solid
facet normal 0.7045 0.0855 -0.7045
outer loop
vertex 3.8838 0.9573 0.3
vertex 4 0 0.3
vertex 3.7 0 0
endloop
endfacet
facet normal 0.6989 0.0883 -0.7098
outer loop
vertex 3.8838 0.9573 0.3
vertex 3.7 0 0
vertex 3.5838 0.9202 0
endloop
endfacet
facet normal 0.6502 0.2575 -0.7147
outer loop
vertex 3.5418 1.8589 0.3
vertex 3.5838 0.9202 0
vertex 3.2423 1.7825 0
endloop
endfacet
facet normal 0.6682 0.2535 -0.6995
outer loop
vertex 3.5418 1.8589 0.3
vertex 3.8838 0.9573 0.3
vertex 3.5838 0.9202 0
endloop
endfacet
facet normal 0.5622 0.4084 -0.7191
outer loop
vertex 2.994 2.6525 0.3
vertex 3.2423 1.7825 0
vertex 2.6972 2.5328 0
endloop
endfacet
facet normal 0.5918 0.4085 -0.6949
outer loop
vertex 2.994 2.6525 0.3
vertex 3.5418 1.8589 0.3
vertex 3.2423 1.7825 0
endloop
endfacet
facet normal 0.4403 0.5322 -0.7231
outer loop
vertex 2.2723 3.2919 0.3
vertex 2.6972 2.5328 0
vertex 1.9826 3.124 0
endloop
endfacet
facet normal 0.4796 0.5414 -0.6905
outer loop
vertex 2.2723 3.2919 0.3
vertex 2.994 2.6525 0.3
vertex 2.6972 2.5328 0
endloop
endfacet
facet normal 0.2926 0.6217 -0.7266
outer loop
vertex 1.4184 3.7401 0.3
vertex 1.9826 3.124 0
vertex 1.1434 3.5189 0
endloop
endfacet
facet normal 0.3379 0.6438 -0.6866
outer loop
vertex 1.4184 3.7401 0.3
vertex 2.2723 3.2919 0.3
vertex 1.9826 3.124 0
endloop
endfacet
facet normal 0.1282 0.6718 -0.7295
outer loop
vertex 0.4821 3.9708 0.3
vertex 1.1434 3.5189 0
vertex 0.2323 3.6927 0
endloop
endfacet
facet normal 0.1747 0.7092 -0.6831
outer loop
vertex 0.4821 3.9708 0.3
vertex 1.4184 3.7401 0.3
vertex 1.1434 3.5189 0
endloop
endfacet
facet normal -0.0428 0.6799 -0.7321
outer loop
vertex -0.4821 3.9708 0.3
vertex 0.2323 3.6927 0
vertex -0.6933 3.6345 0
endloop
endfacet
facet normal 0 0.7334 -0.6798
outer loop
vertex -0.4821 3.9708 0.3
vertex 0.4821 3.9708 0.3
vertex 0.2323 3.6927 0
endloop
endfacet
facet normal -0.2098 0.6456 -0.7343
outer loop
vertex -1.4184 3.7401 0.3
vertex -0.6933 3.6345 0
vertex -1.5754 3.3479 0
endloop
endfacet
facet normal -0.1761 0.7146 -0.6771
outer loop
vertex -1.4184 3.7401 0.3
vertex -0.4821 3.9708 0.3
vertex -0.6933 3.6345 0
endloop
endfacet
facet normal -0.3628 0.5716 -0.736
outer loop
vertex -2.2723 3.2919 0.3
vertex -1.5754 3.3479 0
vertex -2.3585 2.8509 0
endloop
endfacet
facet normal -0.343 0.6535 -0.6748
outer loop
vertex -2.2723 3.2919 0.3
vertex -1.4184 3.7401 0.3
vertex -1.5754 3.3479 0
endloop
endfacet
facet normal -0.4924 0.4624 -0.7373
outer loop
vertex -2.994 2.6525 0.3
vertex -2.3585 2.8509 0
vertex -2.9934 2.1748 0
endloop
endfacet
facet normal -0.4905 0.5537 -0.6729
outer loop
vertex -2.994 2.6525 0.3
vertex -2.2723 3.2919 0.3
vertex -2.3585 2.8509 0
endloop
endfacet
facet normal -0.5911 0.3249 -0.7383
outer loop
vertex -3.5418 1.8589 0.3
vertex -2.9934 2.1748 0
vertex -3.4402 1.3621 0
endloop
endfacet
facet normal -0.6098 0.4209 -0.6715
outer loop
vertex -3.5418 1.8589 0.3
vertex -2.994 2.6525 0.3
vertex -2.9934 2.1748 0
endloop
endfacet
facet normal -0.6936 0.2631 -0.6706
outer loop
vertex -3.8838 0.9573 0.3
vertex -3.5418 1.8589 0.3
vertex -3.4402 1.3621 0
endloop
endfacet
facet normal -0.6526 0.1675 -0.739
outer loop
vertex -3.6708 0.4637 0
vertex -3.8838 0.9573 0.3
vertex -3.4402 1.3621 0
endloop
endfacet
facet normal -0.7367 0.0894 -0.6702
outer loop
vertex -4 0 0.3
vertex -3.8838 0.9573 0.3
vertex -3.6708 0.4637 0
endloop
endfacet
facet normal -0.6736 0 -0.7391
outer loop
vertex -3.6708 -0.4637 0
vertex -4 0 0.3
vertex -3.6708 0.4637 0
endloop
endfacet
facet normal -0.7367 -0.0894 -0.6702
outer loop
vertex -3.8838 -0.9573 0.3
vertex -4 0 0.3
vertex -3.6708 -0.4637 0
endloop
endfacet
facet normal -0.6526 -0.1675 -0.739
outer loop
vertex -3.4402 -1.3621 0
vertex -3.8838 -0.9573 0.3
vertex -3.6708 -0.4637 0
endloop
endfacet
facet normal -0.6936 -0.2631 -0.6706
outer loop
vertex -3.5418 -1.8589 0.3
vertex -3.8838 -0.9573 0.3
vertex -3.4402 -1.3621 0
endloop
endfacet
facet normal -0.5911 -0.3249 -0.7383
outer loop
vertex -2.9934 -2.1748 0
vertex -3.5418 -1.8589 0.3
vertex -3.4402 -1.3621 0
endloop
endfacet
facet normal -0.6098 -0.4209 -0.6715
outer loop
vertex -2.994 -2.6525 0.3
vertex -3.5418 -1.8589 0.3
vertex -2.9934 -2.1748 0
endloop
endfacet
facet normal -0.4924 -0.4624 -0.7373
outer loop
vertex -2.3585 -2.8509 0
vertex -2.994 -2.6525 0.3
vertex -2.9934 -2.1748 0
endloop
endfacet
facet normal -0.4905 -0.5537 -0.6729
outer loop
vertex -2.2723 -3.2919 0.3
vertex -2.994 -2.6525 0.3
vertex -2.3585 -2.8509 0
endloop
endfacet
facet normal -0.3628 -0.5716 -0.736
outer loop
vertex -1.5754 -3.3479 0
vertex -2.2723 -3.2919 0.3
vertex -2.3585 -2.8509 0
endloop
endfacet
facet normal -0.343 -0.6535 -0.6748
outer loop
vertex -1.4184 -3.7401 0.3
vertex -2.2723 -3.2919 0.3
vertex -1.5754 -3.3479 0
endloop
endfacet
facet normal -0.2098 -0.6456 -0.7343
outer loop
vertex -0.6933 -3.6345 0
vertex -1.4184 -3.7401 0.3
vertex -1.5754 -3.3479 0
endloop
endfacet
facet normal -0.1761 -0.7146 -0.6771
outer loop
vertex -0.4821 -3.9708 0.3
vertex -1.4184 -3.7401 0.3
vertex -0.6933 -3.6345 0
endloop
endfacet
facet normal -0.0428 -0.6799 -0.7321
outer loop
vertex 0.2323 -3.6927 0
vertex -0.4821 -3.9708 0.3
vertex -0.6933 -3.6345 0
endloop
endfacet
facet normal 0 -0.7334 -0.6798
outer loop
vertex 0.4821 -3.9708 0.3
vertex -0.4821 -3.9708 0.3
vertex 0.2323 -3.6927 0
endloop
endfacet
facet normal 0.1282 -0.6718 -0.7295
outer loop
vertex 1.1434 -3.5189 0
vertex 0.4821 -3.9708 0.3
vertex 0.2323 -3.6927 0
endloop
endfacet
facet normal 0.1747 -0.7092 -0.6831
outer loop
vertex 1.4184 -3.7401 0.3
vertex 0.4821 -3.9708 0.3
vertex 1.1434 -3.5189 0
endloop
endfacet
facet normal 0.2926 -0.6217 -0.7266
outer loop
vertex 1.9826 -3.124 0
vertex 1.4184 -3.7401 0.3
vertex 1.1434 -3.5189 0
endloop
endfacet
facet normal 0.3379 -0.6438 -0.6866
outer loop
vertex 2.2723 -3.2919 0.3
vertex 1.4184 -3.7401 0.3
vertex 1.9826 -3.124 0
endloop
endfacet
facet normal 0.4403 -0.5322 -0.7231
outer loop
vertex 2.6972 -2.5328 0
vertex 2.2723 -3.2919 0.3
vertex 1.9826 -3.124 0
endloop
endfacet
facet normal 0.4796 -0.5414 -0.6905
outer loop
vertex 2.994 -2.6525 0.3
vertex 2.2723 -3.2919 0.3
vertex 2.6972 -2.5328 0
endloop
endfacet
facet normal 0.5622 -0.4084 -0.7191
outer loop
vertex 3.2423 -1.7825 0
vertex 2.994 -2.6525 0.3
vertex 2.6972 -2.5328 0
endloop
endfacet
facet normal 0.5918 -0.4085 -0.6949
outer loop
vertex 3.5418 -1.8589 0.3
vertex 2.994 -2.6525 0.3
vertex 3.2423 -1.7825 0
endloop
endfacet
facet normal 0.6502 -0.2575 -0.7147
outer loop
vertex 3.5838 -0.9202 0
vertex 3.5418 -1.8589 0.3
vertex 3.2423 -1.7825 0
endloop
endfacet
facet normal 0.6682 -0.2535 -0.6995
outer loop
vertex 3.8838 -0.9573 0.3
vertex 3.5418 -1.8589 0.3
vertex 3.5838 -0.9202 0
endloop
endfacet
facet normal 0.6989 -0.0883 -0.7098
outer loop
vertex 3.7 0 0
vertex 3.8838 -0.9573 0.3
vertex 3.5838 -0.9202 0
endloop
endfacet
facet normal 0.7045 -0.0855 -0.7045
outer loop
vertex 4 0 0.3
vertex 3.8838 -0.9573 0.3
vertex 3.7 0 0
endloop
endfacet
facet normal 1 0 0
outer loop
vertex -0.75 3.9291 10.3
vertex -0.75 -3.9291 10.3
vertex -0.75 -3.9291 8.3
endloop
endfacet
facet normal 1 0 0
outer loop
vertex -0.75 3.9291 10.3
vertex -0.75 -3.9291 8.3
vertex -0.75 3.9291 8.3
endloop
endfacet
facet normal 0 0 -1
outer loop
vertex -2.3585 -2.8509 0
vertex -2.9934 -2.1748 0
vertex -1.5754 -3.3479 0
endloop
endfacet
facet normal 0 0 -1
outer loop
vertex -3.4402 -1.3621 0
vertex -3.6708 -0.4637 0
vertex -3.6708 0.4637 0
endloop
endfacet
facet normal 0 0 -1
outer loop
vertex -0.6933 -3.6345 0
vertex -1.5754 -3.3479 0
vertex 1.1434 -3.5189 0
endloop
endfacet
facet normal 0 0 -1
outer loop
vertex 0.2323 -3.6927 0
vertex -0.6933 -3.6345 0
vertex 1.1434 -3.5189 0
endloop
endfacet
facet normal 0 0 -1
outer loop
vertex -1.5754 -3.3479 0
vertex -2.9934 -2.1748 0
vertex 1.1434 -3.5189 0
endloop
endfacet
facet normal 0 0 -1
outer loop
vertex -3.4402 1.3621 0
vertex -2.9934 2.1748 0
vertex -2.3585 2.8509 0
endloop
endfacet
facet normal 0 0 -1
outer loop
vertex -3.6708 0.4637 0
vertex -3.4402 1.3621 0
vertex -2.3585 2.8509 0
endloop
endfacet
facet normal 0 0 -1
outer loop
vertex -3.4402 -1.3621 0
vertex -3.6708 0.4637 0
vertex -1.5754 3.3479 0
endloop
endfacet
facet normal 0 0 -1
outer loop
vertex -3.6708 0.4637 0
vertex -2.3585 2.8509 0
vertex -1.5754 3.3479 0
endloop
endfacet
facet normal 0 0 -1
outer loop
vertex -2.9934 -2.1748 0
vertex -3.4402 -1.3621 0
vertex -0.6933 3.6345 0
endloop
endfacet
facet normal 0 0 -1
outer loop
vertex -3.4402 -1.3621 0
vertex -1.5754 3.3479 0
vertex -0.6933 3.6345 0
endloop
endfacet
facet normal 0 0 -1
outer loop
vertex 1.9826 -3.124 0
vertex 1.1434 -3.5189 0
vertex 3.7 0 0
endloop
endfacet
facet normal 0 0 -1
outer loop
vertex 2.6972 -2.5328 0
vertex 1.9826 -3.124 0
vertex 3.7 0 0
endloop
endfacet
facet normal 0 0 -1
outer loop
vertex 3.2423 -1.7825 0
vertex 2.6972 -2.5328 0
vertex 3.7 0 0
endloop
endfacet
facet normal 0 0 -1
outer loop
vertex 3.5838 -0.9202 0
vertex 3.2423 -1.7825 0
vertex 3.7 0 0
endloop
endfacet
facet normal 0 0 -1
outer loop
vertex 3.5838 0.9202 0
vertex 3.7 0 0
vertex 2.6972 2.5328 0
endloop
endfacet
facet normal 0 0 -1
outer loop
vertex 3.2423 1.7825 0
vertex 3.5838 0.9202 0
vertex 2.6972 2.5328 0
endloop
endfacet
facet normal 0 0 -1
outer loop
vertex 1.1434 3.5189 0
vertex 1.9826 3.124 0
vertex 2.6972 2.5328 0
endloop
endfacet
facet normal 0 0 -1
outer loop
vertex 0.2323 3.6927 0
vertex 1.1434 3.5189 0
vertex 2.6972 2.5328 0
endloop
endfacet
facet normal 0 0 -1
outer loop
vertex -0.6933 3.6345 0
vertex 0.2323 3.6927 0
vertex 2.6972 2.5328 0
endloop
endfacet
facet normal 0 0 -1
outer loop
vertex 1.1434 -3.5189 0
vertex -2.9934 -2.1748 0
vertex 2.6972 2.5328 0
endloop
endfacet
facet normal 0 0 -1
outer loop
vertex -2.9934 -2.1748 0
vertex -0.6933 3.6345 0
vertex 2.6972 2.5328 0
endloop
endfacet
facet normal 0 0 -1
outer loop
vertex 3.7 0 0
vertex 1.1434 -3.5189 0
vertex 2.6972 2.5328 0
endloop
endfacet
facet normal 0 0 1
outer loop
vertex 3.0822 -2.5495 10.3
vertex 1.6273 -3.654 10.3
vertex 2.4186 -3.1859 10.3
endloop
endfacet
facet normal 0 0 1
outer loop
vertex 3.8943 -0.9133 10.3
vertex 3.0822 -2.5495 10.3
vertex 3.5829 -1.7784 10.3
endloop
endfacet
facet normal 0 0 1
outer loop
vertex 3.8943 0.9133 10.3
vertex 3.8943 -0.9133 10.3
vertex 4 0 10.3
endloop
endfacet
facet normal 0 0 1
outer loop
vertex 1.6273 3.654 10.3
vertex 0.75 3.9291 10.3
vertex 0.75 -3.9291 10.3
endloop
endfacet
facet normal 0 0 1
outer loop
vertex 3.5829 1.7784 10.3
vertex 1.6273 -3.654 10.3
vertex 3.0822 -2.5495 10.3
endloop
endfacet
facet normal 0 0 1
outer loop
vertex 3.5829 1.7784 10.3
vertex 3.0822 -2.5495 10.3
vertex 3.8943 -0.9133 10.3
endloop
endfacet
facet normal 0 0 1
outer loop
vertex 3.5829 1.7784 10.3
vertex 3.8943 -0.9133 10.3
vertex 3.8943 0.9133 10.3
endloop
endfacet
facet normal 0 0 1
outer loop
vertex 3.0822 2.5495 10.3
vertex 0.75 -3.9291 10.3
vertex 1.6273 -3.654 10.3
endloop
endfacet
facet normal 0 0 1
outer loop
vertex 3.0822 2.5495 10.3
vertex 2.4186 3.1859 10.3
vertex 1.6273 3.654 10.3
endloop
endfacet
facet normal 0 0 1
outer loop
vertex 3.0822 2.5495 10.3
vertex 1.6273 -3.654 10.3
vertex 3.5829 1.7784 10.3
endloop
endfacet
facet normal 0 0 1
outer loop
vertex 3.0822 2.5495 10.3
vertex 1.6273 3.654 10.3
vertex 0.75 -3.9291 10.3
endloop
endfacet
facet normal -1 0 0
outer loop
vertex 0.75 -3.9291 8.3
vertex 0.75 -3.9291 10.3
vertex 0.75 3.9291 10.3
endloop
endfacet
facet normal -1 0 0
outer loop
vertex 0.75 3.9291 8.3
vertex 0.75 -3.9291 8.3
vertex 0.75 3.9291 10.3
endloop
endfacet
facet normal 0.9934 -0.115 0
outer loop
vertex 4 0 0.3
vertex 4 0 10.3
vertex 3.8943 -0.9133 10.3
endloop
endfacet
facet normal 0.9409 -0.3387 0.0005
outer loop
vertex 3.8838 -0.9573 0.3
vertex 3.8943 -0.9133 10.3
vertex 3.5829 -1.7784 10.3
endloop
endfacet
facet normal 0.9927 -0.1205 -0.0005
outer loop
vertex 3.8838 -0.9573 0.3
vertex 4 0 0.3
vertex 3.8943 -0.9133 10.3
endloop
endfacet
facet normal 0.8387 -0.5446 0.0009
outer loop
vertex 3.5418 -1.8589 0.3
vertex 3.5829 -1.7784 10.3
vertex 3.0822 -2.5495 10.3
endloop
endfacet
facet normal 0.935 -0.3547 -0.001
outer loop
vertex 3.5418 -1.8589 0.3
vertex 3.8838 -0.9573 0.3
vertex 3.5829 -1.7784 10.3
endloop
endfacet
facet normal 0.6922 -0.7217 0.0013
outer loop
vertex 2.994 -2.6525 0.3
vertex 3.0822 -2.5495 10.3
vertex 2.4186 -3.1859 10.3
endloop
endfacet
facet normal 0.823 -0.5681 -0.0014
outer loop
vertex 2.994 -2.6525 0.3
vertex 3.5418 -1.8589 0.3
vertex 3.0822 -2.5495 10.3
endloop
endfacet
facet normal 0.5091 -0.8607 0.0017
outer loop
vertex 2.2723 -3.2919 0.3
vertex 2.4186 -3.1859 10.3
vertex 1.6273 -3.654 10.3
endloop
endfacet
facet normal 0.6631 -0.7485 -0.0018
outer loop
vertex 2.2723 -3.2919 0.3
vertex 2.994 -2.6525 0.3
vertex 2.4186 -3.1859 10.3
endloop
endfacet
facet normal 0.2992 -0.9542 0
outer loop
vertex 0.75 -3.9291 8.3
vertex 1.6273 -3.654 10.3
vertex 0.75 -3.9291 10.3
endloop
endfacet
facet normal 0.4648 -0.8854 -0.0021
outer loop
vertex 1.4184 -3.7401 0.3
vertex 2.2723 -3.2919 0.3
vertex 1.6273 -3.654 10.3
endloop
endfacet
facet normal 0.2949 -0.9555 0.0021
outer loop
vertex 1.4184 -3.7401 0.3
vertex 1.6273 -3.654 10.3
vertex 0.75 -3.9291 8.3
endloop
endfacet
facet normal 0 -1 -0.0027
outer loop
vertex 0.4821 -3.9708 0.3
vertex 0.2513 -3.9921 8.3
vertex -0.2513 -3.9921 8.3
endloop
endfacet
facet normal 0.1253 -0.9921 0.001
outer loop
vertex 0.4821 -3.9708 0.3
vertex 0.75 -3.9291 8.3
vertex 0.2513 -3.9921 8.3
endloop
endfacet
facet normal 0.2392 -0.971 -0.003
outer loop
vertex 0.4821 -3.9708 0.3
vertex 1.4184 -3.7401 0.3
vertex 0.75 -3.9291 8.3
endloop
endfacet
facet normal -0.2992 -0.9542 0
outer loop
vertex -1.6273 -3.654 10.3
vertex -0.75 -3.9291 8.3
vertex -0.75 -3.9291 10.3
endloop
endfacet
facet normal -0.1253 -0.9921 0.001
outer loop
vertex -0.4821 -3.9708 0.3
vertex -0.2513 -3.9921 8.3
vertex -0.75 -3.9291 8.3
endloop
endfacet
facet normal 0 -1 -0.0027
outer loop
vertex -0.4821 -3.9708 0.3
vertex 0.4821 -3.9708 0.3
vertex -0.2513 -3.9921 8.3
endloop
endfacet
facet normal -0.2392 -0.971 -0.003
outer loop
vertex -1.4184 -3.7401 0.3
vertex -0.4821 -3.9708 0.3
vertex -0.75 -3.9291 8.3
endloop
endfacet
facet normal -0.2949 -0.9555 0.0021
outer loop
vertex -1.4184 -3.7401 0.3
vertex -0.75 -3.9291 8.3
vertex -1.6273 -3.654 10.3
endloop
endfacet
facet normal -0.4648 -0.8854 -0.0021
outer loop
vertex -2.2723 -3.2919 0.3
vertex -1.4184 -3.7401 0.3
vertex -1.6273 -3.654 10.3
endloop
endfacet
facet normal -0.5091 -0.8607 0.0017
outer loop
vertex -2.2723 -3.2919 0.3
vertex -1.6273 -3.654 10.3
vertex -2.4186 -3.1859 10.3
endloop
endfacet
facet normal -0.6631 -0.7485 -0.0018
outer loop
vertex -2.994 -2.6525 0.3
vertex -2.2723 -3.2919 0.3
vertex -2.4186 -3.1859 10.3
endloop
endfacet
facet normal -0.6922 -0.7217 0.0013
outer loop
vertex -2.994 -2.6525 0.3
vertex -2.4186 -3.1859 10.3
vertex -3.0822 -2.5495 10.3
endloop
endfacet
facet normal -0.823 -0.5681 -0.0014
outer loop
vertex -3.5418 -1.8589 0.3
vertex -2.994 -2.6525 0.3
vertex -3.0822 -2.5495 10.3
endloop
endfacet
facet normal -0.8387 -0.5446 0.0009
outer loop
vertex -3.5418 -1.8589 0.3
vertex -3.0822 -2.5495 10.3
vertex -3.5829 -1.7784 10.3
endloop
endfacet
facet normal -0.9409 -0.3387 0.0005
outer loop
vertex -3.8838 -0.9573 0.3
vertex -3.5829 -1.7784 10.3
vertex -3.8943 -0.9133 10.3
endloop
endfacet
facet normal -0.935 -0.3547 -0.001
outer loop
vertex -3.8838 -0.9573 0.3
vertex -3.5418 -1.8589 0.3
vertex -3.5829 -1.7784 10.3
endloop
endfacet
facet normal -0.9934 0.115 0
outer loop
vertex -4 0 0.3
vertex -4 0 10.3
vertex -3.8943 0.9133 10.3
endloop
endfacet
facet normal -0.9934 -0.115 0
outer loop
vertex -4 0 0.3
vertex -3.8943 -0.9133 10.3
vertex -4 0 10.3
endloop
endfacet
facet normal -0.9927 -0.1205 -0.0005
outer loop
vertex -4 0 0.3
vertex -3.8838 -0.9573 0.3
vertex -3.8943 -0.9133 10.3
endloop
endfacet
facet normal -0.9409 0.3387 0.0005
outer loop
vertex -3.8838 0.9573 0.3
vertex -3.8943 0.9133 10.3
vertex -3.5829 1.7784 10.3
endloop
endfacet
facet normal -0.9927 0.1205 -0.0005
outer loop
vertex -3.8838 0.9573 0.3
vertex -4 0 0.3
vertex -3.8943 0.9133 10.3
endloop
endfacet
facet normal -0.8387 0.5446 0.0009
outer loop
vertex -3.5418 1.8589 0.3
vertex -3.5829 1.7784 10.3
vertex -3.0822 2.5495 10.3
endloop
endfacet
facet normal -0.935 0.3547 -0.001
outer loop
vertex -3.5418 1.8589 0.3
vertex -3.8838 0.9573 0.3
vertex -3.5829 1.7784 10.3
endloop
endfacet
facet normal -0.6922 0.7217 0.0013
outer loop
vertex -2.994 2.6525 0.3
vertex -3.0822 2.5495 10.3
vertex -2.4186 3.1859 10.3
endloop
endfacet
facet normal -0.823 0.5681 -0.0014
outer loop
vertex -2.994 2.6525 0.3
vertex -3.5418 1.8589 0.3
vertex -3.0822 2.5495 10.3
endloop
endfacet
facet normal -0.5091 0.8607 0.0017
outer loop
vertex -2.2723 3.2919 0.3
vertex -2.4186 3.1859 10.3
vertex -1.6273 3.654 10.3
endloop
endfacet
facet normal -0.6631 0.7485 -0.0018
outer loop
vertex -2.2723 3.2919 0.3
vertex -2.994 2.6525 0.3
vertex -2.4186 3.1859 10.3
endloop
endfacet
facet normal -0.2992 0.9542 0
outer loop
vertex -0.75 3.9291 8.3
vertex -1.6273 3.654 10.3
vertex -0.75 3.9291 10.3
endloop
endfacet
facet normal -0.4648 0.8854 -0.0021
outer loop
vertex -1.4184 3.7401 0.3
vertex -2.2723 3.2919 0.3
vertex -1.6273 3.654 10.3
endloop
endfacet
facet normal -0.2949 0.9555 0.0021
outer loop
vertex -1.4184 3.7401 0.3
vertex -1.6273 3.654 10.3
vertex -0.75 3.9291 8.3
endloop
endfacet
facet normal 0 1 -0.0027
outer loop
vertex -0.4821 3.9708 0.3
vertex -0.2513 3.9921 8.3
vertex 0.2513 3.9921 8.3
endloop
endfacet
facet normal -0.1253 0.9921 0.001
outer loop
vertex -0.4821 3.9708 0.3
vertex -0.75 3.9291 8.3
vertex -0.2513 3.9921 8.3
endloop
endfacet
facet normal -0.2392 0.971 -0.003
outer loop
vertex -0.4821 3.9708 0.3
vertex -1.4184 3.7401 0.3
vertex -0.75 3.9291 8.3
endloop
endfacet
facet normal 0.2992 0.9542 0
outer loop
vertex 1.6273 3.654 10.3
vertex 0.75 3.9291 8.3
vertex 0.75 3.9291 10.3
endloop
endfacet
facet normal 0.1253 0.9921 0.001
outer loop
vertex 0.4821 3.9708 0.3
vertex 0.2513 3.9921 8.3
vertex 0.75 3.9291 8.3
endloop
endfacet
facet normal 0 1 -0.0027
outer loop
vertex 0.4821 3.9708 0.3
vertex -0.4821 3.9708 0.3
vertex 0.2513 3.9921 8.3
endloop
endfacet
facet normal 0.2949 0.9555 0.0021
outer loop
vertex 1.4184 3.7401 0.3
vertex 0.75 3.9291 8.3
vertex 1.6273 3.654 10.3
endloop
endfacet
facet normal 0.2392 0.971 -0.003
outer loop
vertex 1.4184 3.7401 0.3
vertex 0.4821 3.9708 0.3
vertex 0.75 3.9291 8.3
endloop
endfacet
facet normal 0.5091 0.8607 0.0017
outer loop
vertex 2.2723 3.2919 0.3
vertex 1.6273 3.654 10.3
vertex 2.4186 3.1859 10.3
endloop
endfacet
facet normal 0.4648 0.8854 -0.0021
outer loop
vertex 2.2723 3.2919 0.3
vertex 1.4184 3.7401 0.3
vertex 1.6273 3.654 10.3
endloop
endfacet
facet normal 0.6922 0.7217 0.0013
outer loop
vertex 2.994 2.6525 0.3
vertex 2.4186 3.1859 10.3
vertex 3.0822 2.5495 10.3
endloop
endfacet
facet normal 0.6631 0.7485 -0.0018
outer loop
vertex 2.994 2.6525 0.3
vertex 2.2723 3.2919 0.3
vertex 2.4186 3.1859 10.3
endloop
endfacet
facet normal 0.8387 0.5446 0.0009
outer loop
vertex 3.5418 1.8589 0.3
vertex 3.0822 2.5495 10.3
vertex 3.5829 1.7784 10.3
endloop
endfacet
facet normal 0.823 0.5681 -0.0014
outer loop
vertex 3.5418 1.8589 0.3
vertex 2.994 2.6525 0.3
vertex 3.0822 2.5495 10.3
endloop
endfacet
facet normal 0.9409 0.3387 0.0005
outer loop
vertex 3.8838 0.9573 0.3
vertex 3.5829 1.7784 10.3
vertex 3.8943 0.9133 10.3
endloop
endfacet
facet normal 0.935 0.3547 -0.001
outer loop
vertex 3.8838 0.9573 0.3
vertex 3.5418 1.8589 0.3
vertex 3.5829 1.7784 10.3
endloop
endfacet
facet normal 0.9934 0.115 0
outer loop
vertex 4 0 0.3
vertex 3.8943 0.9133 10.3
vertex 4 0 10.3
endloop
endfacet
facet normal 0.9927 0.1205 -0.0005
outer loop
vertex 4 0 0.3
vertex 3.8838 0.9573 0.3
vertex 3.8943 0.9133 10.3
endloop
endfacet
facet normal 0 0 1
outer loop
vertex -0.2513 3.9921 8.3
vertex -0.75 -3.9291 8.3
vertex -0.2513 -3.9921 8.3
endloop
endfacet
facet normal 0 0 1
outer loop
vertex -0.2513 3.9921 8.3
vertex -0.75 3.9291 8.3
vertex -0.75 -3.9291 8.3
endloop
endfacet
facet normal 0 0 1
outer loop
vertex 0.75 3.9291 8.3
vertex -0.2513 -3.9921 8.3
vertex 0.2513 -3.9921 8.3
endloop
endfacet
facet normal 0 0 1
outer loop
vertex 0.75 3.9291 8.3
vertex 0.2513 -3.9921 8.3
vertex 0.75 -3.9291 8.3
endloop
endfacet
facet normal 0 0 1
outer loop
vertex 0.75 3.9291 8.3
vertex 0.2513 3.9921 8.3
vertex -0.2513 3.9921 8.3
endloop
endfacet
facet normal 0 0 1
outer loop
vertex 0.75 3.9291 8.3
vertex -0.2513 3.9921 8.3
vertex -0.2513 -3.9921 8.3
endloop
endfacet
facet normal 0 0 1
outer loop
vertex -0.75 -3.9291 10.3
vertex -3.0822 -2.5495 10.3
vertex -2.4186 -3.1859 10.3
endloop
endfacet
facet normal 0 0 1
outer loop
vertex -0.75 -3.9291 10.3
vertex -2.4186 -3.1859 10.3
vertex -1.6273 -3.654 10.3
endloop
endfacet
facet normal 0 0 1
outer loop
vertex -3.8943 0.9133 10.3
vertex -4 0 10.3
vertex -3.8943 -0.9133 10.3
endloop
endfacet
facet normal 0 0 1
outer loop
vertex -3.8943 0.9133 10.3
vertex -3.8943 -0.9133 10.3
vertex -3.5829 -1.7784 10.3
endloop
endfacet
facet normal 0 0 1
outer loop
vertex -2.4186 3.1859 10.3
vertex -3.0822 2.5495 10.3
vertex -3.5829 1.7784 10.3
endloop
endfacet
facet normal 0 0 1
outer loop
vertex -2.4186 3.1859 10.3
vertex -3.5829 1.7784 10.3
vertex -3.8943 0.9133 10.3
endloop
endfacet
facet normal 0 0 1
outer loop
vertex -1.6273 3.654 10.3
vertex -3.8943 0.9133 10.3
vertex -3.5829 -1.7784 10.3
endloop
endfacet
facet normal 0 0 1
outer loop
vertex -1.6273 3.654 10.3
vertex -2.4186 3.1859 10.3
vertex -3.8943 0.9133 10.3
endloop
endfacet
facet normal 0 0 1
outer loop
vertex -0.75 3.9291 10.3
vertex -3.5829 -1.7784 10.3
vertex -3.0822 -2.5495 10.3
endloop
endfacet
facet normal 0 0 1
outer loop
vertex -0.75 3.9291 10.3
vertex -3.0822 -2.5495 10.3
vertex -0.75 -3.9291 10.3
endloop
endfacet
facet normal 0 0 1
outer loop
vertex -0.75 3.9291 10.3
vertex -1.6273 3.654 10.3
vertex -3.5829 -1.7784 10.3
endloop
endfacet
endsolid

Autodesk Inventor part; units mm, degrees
ref_plane "YZ Plane" through (0, 0, 0) normal (1, 0, 0) x (0, 1, 0)
ref_plane "XZ Plane" through (0, 0, 0) normal (0, 1, 0) x (-1, 0, 0)
ref_plane "XY Plane" through (0, 0, 0) normal (0, 0, 1) x (1, 0, 0)
sketch "Sketch1" plane through (0, 0, 0) normal (0, 0, 1) x (1, 0, 0)
  circle A0 centre (0, 0) radius 4
  dimension "d0" = 8
extrude "Extrusion1" add sketch "Sketch1" along normal blind 10.3
chamfer "Chamfer1" distance 0.3 angle 45 1 edges at (-4, 0, 0)
thread "Thread1" size "M8x1" class "6g" standard "ANSI Metric M Profile" full length
sketch "Sketch2" plane through (0, 0, 10.3) normal (0, 0, 1) x (1, 0, 0)
  circle A0 centre (0, 0) radius 4 projected
  line L0 (-0.75, -3.9291) -> (-0.75, 3.9291)
  line L1 (0.75, -3.9291) -> (0.75, 3.9291)
  dimension "d7" = 1.5
  dimension "d8" = 0.75
extrude "Extrusion2" cut sketch "Sketch2" against normal blind 2 contours L1 A0 L0
equation "\"d8\" = 0.5 * d7"
properties part number "Terminal Screw" material "Steel, Mild"
